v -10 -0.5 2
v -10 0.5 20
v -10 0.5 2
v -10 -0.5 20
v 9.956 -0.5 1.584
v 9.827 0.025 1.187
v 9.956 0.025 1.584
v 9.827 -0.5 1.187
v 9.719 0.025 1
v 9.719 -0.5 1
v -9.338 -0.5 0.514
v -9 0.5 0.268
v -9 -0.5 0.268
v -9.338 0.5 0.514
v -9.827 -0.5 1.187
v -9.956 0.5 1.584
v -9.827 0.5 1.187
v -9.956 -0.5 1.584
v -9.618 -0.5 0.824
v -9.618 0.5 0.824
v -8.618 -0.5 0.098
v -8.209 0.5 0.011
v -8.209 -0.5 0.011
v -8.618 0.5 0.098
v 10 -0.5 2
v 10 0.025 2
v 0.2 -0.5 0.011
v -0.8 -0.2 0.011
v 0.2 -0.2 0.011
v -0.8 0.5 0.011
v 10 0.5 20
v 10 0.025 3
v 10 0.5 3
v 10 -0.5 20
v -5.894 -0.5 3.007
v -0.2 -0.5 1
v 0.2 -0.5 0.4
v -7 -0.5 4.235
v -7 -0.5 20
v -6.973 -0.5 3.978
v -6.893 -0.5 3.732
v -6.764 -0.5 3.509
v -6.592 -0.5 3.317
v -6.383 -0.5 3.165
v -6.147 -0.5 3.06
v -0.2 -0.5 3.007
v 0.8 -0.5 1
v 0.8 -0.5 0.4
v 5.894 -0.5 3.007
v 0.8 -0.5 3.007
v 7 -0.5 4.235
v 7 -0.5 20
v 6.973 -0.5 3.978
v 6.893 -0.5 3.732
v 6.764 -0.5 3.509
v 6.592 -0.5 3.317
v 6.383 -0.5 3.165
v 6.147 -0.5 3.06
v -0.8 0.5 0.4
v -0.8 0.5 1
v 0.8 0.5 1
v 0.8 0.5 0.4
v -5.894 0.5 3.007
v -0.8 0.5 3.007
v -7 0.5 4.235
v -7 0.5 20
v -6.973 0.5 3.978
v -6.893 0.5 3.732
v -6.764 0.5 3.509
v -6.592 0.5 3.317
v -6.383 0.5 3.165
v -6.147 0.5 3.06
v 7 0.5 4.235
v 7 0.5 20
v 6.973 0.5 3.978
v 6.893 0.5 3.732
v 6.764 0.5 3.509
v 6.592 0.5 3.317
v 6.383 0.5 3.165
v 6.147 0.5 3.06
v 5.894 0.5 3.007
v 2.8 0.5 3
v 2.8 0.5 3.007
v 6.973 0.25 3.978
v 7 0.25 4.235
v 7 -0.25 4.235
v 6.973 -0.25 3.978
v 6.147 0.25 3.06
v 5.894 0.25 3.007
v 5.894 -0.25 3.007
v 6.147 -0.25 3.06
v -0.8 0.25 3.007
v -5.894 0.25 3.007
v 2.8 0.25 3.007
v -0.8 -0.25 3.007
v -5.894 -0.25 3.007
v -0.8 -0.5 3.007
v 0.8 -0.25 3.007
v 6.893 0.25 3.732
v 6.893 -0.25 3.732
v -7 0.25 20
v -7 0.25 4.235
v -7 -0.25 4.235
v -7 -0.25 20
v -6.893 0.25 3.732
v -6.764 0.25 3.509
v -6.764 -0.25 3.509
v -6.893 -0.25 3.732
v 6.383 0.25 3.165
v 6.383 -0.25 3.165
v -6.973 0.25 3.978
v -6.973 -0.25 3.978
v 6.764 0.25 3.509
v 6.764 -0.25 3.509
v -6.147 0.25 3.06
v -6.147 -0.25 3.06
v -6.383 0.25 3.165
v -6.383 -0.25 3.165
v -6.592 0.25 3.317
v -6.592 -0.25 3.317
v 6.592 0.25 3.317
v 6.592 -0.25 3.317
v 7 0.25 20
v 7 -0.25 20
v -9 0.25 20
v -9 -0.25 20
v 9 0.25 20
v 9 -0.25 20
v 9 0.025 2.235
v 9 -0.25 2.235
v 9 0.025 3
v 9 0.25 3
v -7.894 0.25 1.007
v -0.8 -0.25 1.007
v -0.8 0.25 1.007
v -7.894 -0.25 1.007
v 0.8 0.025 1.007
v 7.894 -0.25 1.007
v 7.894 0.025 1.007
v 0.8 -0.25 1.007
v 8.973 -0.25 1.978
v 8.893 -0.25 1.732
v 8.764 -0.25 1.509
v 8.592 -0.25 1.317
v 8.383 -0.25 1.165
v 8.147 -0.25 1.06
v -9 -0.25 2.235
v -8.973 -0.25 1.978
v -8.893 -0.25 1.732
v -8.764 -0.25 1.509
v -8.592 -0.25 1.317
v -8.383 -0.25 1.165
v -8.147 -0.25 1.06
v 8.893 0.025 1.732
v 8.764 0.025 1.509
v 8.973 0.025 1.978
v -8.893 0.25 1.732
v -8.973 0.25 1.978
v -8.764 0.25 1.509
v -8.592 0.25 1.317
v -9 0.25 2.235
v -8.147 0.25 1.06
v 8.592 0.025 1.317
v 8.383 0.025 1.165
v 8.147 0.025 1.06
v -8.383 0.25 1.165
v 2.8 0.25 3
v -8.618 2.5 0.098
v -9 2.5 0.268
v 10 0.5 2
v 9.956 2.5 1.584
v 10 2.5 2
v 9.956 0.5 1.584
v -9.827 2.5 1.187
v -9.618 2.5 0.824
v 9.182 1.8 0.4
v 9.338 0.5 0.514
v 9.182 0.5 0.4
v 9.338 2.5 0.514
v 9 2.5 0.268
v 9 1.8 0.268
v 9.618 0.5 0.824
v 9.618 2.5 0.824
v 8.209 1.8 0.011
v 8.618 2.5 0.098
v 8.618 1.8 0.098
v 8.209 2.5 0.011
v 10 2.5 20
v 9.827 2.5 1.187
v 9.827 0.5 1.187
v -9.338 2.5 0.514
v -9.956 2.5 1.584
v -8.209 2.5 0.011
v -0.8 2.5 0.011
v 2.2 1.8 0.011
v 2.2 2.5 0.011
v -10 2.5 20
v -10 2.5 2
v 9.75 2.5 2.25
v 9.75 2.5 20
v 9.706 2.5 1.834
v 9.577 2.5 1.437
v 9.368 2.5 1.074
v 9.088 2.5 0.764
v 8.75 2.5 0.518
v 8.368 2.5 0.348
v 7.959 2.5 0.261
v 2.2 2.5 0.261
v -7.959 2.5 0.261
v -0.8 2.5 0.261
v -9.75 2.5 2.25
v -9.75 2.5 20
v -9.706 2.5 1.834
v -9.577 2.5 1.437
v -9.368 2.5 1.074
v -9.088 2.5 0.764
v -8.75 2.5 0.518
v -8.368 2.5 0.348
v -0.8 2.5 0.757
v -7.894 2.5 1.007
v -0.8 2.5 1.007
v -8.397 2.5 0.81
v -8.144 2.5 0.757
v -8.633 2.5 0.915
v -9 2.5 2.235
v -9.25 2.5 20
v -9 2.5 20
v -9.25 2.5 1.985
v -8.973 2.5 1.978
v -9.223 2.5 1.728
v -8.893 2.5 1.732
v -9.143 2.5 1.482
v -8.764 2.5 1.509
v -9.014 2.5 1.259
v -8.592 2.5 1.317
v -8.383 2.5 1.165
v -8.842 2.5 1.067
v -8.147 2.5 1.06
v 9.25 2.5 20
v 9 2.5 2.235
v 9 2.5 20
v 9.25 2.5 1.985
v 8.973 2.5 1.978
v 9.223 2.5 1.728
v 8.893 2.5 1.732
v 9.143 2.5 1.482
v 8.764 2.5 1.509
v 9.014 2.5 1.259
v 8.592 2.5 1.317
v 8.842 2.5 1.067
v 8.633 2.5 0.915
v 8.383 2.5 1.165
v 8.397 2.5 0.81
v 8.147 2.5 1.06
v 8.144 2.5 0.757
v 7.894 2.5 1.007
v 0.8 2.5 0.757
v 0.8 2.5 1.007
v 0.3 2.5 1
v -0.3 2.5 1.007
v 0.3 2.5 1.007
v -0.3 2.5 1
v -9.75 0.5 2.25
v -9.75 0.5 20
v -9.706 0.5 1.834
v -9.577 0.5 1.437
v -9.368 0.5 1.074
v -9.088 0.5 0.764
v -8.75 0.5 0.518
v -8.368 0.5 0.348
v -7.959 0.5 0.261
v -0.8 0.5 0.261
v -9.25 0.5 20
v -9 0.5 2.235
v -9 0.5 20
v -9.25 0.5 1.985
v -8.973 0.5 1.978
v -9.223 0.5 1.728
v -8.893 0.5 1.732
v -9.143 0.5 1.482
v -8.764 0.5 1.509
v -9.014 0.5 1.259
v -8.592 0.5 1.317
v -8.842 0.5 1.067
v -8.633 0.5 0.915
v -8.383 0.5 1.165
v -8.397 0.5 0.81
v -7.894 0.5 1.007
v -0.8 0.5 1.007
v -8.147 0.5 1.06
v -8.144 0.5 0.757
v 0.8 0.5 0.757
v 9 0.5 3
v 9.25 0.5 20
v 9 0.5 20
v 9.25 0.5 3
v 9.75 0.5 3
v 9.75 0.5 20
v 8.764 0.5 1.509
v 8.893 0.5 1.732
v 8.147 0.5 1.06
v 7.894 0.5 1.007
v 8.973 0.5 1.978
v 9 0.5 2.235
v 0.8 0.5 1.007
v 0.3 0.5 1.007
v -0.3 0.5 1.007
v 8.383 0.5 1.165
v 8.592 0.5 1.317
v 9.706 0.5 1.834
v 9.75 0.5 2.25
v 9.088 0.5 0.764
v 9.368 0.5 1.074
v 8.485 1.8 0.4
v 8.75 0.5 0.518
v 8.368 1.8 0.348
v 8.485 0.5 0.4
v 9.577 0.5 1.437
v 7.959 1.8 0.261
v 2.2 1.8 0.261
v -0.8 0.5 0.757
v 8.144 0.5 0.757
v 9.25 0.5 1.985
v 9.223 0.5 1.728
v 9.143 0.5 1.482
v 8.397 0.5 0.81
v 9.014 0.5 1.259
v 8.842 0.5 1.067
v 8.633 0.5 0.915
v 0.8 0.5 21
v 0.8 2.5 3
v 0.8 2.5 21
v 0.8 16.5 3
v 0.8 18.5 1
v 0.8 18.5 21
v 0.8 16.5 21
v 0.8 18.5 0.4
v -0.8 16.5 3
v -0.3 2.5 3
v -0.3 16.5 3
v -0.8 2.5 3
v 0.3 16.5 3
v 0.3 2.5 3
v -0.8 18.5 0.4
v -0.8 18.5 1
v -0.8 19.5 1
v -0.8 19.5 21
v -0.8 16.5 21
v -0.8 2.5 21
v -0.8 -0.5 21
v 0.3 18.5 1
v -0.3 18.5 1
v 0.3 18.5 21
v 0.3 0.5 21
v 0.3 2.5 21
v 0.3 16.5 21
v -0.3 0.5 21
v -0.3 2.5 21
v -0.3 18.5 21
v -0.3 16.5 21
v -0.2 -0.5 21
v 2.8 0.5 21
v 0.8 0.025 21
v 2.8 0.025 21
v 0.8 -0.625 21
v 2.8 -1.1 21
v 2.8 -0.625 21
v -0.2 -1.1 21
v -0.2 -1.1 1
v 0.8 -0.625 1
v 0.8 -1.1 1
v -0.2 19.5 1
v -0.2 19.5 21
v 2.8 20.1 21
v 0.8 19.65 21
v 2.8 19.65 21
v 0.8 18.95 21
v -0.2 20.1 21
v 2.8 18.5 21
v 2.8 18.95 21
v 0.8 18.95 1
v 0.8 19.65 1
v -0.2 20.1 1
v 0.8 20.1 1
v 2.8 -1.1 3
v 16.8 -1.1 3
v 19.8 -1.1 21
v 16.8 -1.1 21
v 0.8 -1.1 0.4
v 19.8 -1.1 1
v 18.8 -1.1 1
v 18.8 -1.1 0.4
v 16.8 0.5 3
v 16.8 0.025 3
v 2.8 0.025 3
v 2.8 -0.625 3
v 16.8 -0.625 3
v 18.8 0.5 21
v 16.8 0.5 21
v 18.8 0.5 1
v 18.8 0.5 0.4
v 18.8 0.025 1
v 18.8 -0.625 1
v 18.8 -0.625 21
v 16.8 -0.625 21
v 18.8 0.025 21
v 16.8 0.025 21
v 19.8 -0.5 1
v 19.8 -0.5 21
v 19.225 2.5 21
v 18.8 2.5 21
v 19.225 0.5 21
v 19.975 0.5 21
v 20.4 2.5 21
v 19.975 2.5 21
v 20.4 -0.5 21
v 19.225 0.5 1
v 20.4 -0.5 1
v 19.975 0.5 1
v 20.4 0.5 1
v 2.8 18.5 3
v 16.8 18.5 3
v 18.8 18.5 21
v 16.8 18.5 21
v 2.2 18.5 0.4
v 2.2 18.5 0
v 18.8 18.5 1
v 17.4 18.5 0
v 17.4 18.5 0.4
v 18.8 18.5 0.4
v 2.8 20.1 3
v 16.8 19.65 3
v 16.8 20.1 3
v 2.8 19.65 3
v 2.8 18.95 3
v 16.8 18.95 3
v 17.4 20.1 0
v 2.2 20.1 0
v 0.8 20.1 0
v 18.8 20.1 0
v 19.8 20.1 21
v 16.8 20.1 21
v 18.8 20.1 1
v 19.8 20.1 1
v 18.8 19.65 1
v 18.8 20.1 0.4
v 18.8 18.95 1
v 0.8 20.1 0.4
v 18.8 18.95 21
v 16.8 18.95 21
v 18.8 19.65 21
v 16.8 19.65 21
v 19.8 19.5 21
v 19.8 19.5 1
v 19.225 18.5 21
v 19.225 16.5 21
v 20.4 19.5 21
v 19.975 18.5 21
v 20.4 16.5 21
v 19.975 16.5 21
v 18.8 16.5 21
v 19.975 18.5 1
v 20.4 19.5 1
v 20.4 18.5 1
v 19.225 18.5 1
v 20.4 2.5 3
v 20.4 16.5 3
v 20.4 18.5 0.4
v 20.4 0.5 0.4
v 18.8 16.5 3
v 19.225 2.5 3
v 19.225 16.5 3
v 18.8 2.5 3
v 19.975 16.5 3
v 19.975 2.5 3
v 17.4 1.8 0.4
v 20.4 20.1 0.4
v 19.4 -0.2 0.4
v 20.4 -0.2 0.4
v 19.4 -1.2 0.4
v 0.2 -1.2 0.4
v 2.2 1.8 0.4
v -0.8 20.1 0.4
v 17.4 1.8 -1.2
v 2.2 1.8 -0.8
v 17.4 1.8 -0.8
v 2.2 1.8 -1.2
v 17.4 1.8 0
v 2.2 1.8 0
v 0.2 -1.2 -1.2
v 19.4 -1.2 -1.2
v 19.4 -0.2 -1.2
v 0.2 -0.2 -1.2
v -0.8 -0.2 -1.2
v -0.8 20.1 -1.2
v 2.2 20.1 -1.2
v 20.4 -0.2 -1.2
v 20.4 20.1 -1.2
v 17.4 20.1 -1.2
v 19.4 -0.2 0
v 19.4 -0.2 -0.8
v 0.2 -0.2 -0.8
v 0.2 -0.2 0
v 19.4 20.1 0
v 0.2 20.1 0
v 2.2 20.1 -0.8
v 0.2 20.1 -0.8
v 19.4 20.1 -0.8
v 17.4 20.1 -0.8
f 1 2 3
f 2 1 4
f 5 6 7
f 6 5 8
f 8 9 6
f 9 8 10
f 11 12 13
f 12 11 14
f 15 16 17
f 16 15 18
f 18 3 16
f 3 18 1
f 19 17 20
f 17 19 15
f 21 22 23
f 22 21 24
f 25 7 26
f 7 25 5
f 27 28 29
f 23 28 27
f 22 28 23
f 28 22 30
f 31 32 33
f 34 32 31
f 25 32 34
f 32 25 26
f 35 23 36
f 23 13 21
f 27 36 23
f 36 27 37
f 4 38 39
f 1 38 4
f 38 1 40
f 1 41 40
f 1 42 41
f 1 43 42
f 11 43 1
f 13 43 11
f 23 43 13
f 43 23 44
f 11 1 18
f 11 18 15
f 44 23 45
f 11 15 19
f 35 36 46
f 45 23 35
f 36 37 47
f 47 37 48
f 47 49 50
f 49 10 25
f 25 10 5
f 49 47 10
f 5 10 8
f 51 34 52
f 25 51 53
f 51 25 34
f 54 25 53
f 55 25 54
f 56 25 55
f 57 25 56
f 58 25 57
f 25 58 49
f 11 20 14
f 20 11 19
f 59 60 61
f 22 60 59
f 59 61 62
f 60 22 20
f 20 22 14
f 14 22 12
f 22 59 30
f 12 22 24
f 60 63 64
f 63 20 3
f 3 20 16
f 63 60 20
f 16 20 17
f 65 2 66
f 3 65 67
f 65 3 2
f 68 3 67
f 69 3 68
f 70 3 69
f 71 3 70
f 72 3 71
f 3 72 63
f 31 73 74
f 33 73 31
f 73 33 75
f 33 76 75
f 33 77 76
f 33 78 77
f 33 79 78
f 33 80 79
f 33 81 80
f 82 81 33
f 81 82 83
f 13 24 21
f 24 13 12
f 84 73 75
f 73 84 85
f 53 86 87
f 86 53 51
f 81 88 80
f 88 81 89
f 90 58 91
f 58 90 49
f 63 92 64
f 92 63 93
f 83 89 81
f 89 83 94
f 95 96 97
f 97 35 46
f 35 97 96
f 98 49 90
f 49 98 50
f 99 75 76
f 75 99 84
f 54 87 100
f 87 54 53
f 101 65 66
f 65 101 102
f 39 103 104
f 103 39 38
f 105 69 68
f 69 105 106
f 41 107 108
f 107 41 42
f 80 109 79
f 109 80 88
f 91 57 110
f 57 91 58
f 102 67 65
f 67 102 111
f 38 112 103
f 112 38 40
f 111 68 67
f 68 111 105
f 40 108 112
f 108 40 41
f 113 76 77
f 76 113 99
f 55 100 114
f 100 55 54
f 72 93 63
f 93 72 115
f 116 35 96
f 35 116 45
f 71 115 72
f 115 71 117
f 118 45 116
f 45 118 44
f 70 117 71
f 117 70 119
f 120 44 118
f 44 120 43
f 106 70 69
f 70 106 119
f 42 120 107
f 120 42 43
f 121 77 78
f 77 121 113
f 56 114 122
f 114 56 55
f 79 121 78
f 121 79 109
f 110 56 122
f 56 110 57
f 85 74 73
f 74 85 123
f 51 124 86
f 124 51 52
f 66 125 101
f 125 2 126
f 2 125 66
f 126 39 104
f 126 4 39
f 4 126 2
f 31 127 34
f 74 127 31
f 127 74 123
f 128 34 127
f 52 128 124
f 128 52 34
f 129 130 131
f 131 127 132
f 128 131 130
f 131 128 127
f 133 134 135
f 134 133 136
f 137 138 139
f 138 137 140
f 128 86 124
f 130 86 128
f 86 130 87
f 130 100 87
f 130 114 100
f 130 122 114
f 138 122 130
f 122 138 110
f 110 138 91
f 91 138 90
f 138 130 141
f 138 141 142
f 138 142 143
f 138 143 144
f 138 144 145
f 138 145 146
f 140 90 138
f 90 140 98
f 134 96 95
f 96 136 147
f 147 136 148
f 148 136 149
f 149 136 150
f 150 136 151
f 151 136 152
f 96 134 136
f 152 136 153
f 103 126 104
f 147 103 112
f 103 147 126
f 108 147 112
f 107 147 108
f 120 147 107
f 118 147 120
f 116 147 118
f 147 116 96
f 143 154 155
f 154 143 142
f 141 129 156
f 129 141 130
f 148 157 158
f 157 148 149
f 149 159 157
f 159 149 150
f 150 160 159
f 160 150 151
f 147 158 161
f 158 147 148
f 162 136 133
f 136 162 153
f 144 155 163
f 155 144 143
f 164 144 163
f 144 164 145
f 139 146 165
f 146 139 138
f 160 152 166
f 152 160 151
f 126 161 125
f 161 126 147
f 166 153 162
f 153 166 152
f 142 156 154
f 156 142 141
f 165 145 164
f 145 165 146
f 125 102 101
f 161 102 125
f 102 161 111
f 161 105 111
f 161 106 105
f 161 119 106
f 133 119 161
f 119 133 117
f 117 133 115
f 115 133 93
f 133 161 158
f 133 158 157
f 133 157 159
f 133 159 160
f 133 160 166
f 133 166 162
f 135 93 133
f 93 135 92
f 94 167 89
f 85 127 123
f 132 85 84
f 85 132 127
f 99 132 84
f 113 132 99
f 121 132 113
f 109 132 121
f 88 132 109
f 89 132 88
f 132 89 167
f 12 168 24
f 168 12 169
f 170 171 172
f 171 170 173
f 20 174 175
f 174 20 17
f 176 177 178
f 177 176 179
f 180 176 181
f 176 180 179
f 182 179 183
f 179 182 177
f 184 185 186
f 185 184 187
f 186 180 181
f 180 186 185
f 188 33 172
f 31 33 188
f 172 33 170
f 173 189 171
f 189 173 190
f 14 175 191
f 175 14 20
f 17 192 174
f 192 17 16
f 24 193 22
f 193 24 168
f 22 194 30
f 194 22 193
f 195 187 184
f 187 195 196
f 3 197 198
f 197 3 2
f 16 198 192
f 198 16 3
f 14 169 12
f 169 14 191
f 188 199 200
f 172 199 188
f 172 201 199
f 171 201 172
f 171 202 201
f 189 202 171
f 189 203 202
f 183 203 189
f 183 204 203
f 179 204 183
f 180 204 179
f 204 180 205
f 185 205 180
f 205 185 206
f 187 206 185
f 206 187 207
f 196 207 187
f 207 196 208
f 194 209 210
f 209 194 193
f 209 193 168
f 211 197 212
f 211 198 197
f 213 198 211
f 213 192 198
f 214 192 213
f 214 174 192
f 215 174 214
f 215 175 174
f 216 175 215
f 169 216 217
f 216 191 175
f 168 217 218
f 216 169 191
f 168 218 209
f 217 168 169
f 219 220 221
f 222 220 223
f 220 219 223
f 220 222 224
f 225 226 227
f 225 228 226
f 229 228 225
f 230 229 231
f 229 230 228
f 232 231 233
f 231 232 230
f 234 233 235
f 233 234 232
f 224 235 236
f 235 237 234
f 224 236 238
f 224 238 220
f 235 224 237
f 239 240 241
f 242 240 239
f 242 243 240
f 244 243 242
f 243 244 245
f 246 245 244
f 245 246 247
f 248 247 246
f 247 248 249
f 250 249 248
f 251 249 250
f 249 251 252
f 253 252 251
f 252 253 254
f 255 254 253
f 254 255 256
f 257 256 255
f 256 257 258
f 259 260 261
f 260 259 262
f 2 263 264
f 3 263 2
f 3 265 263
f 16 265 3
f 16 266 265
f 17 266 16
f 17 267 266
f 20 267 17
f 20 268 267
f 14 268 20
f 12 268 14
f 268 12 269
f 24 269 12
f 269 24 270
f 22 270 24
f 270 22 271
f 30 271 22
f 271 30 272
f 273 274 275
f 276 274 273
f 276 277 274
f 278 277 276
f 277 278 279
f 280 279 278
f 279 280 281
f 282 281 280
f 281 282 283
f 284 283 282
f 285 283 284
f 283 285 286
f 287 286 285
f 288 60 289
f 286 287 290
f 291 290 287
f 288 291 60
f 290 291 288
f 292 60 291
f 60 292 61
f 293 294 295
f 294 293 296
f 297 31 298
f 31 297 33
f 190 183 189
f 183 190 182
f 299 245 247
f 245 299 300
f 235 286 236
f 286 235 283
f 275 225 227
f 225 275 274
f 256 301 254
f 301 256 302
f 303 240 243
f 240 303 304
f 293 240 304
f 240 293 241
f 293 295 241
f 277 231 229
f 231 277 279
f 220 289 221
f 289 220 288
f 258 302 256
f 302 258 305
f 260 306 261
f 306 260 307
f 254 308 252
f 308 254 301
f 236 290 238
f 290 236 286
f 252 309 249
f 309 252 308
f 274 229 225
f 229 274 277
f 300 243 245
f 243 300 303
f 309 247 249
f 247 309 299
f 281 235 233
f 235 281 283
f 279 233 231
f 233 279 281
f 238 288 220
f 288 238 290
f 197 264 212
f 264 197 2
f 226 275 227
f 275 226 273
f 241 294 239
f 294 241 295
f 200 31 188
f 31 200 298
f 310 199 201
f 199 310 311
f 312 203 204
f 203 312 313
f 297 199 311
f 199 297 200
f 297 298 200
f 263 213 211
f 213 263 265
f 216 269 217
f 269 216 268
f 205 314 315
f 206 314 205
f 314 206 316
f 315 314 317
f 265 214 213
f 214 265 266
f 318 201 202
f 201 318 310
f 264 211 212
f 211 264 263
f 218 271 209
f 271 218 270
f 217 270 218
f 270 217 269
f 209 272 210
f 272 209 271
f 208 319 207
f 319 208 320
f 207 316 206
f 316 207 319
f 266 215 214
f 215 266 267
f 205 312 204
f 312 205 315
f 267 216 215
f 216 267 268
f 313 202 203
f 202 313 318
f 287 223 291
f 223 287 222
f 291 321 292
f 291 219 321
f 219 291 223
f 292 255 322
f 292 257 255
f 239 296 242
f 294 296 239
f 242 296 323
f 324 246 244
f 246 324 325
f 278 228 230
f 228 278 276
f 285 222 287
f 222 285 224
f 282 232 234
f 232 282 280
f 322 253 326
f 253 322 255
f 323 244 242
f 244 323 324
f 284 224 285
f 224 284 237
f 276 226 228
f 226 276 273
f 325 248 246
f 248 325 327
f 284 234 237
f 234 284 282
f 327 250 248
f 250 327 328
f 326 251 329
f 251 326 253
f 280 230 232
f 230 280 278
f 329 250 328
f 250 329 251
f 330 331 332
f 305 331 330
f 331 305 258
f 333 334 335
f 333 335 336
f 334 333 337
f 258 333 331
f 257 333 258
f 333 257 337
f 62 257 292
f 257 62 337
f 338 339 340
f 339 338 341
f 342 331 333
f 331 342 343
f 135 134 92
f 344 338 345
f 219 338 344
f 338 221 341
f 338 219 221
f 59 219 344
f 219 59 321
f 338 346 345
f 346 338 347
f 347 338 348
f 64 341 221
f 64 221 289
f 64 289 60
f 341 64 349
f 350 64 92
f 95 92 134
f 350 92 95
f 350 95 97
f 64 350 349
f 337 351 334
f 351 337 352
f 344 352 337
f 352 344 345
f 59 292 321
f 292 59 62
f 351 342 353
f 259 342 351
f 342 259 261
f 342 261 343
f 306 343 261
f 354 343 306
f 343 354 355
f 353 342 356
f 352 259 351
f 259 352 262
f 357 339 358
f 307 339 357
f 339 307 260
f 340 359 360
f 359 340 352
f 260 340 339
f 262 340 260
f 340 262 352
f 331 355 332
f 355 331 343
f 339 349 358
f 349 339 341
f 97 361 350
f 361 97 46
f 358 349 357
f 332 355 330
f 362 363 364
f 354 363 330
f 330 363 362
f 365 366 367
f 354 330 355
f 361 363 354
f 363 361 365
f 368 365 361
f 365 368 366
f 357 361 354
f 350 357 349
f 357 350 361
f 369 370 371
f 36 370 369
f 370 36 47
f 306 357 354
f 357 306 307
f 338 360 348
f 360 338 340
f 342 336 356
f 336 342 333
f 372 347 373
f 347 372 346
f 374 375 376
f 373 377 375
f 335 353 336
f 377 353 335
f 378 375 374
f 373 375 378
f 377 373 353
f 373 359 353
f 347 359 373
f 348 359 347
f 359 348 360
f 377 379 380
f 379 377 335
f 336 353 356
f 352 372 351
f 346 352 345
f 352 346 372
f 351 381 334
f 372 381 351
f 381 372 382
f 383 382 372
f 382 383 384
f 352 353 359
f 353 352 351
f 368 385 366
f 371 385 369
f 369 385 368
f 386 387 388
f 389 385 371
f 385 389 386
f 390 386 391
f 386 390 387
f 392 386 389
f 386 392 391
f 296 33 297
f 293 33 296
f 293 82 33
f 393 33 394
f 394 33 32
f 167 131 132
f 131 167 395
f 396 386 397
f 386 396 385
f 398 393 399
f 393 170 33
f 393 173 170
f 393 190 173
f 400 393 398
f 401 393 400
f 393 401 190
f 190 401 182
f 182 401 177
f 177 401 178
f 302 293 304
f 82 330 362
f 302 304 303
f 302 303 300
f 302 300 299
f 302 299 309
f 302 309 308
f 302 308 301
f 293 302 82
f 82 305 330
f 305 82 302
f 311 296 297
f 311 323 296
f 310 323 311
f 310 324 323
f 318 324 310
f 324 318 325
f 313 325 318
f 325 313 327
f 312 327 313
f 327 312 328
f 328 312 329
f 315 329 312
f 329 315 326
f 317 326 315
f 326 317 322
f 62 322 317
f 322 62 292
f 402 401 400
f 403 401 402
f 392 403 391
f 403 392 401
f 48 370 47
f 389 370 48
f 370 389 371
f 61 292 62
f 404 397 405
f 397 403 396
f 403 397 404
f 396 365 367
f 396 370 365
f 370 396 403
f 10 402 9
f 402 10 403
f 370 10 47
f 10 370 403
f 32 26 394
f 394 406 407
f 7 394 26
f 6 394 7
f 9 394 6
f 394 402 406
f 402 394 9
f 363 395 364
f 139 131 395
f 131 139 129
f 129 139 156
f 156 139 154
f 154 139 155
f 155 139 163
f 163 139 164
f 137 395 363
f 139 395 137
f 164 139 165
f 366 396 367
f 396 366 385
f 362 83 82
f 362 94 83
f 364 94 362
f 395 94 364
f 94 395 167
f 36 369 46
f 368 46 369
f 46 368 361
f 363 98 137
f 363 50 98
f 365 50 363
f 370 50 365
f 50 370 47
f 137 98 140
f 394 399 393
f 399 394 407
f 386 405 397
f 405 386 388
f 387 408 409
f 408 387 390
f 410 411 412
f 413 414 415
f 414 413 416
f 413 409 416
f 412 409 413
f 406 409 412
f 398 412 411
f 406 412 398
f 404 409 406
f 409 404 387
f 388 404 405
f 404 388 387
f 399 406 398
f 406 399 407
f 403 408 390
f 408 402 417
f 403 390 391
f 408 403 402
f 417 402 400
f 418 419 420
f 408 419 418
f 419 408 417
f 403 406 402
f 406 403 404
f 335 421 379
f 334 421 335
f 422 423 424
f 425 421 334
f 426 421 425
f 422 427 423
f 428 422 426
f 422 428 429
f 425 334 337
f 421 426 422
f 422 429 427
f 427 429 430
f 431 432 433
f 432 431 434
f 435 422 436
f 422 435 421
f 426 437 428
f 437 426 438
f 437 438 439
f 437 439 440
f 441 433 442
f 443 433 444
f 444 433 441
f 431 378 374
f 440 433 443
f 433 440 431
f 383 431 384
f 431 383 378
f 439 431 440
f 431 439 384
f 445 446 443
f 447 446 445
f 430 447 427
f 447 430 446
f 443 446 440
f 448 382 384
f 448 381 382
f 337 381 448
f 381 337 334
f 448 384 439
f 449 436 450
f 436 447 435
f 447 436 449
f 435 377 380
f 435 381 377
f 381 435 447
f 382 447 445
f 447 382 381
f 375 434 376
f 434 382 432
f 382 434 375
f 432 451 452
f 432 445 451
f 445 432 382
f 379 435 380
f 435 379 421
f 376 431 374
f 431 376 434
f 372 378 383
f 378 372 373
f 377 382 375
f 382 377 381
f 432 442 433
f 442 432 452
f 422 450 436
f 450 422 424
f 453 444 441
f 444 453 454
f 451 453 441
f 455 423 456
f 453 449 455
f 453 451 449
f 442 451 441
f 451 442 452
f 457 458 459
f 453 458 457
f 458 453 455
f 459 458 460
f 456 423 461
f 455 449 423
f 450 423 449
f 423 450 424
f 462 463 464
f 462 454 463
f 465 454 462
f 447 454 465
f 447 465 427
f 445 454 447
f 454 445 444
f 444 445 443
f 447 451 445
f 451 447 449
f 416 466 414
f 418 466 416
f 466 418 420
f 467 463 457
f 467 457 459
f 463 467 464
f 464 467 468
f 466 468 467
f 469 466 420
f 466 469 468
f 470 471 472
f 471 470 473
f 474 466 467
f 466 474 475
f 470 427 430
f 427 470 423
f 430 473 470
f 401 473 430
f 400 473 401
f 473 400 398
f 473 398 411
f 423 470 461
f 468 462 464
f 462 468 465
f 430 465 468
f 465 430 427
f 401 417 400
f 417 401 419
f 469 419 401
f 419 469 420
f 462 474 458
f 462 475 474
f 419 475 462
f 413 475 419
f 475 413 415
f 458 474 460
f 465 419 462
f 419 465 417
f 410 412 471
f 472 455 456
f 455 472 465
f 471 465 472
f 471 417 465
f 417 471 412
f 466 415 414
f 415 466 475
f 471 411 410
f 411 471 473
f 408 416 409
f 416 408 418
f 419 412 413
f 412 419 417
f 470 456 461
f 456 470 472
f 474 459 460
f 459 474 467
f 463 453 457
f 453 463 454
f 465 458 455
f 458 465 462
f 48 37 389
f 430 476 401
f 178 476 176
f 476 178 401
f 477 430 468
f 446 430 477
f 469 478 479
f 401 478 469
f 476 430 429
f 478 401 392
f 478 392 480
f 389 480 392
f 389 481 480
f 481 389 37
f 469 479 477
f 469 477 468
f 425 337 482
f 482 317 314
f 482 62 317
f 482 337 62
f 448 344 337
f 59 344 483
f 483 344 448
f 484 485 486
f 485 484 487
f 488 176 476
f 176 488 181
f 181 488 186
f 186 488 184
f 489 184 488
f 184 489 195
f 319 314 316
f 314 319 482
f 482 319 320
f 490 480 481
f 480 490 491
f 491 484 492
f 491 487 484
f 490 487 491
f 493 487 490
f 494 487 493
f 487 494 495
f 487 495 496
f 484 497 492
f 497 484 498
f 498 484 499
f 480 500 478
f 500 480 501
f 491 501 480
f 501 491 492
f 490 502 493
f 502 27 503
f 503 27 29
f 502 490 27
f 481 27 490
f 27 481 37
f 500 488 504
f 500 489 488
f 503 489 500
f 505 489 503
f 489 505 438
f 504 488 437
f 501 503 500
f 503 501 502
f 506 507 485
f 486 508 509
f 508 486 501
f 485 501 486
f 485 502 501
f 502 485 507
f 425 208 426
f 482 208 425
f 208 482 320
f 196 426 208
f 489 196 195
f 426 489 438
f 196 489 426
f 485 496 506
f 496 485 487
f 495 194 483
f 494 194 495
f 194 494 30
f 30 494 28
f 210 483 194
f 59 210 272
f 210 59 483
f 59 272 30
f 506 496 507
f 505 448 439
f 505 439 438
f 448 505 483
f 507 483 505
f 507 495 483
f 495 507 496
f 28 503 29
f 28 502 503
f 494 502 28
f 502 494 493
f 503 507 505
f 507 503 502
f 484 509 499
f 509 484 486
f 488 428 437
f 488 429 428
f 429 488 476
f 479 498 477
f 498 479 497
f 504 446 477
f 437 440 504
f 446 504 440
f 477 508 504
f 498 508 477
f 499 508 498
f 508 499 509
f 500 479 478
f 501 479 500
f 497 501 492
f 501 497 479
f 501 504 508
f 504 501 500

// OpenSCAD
// file: CardBoardLibrary.scad
/* This is a library for the generation of cardboard mounts for replacing areas of plastic in 3D-printed parts with cardboard.*/

module linearCardBoardMount(length, height, base_height, depth, cardPer_thickness, align = "xcenter")
{
    if(align == "xcenter" || align == "X")
    {
        difference(){
        translate([-depth/2, 0, 0])cube([depth ,length , height]);
        translate([-cardPer_thickness/2, -0.05, base_height])cube([cardPer_thickness , length+1, height+1]);
        }
    }
    
    if(align == "xycenter" || align == "XY")
    {
        difference(){
        translate([-depth/2, -length/2, 0])cube([depth ,length , height]);
        translate([-cardPer_thickness/2, (-length/2)-0.5, base_height])cube([cardPer_thickness , length+1, height+1]);
        }
    }
    
    if(align == "center" || align == "XYZ")
    {
        difference(){
        translate([-depth/2, -length/2, -height/2])cube([depth ,length , height]);
        translate([-cardPer_thickness/2, (-length/2)-0.5, ( -height/2)+base_height])cube([cardPer_thickness , length+1, height+1]);}
    }
    
    if(align == "nocenter" || align == "")
    {
        difference(){
        cube([depth ,length , height]);
        translate([(-cardPer_thickness/2)+width/2, -0.5, base_height])cube([cardPer_thickness , length+1, height+1]);
        }
    }
}

module UShapeCardPer(height, width, depth, u_depth, mount_depth, cardPer_thickness, radius_outer, radius_inner)
{
    /*CardPer Window*//*
    radius_middle=(radius_outer+radius_inner)/2;
    radius_outerMiddle=(radius_outer+radius_middle)/2;
    difference()
    {
        //outer part
        UShape(height, width, depth, u_width, base_height, radius_outer, radius_inner);
        //cardper part
        translate([0,0,0])UShape(height+0.5, width-base_height, cardPer_thickness, width, base_height, radius_middle, radius_inner);
    }
    /*CardPer U-Slide
    #translate([0,u_width/2,0])UShape(height, width, u_width/2, u_width/4-cardPer_thickness/2, base_height/2-cardPer_thickness/2, radius_outer, radius_middle);
    translate([0,u_width/2,cardPer_thickness])
    UShape(height-cardPer_thickness*2, width-u_width/2-cardPer_thickness, u_width/2, u_width/4-cardPer_thickness/2, 
    base_height/2+cardPer_thickness/2, radius_middle, radius_middle);*/
    
    /*Window*/
    radius_middle=(radius_outer+radius_inner)/2;
    //inner part
    difference()
    {
        //outer frame
        UShape(height, width, u_depth, u_depth+mount_depth, radius_outer, radius_inner);
        //cardper part
        translate([0,0,u_depth])UShape(height, width-2*u_depth, cardPer_thickness, mount_depth*2, radius_inner, radius_inner/1.6);
    }
    
    difference()
    {
        //outer frame
        translate([0,depth/2+u_depth/2,0])UShape(height, width, depth, u_depth, radius_outer, radius_inner);
        //cardper part
        mount_pitch = u_depth/2-cardPer_thickness/2;
        translate([0,depth/2+u_depth/2,mount_pitch])UShape(height, width-2*mount_pitch, depth, cardPer_thickness, radius_outer, radius_inner);
    }
}

$fn=30;
//UShapeCardPer(height, width, depth, u_depth, mount_depth, cardPer_thickness, radius_outer, radius_inner)
UShapeCardPer(20,20, 2, 1, 2, 0.5, 2, 2/1.62);
//UShape(10, 10, 10, 2, 2, 2/1.62);
module UShape(height, width, u_depth, u_width, radius_outer, radius_inner)
{
    difference()
    {
        //outer part
        minkowski()
        {
            translate([-width/2+radius_outer,-u_depth/2,radius_outer])cube([width-radius_outer*2,u_depth-0.00001,height]);
            rotate([90,0,0])cylinder(0.00001,r=radius_outer);
        }
        //inner part
        translate([0,0,u_width])minkowski()
        {
            translate([(width-2*u_width)/-2+radius_inner,-u_depth/2+0.5,radius_inner])cube([width-u_width*2-radius_inner*2,u_depth,height*1.5]);
            rotate([90,0,0])cylinder(1,r=radius_inner);
        }
        //cut of the too long top at height
        translate([-width/2-.1,-u_depth/2-.1,height])cube([width+.2,u_depth+.2,height]);
        
    }
}
// main file
cube_length = 20;

//mountParts settings
mount_height = 2;
base_height = 1;
length = cube_length-2;
space_width0 = 0.6; //front
space_width1 = 0.65; //left
space_width2 = 0.7; //right
space_width3 = 0.75; //back
space_width4 = 0.8; //bottom
outer_width = 1.6;
offset_width = (outer_width-base_height)/2;

include<CardBoardLibrary.scad>

//front
frame(cube_length, cube_length, mount_height, base_height, space_width0, outer_width);
//left
translate([offset_width,-offset_width,0])rotate([0,0,-90])color("blue")frame(cube_length, cube_length, mount_height, base_height, space_width1, outer_width);
//right
translate([offset_width,cube_length-base_height+offset_width,0])rotate([0,0,-90])color("blue")frame(cube_length, cube_length, mount_height, base_height, space_width2, outer_width);
//back
translate([cube_length-base_height+2*offset_width,0,0])frame(cube_length, cube_length, mount_height, base_height, space_width3, outer_width);
//bottom
translate([-offset_width,-offset_width*4,-space_width4/2])rotate([-90,-90,0])color("red")frame(cube_length+offset_width, cube_length+4*offset_width, mount_height, base_height, space_width4, outer_width);


module frame(frame_height,frame_length, mount_height, base_height, space_width, thickness)
{
    translate([0,base_height-base_height/2,0])linearCardBoardMount(frame_length-2*base_height, mount_height+base_height, base_height, thickness, space_width,"X");
    translate([0,-base_height/2,base_height])rotate([90,0,180])linearCardBoardMount(frame_height, mount_height+base_height, base_height, thickness, space_width,"X");
    translate([0,frame_length-base_height/2,base_height])rotate([90,0,0])linearCardBoardMount(frame_height, mount_height+base_height, base_height, thickness, space_width,"X");
}
